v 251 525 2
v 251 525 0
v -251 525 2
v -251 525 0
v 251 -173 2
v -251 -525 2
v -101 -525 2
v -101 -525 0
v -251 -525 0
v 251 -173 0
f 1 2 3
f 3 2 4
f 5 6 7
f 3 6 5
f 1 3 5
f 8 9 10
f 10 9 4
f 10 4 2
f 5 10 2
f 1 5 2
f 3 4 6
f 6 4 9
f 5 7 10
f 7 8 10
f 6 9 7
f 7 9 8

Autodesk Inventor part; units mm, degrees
ref_plane "YZ Plane" through (0, 0, 0) normal (1, 0, 0) x (0, 1, 0)
ref_plane "XZ Plane" through (0, 0, 0) normal (0, 1, 0) x (-1, 0, 0)
ref_plane "XY Plane" through (0, 0, 0) normal (0, 0, 1) x (1, 0, 0)
sketch "Sketch1" plane through (0, 0, 0) normal (0, 0, 1) x (1, 0, 0)
  line L0 (-251, -525) -> (251, -525)
  line L1 (251, -525) -> (251, 525)
  line L2 (251, 525) -> (-251, 525)
  line L3 (-251, 525) -> (-251, -525)
  line L4 (-251, -525) -> (251, 525) construction
  line L5 (251, -525) -> (-251, 525) construction
  line L6 (-101, -525) -> (251, -173)
  point P0 (0, 0)
  dimension "d0" = 502
  dimension "d1" = 1050
  dimension "d12" = 698
  dimension "d13" = 150
extrude "Plate1" add sketch "Sketch1" along normal blind 2 contours L3 L2 L1 L6 L0
sketch "Sketch2" plane through (0, 0, 0) normal (0, 0, -1) x (-1, 0, 0)
  line L0 (-231, 505) -> (-31, 505) construction
  line L1 (-31, 505) -> (-31, 485) construction
  line L2 (-31, 485) -> (-231, 485) construction
  line L3 (-231, 485) -> (-231, 505) construction
  line L4 (-251, 525) -> (251, 525) projected
  line L5 (-251, -173) -> (-251, 525) projected
  point P0 (0, 0)
  point P1 (-48, 100)
  point P2 (-251, -525)
  point P3 (-50, 98)
  dimension "d6" = 200
  dimension "d9" = 20
  dimension "d10" = 20
  dimension "d11" = 20
mark "Mark1"
equation "\"d2\" = Thickness"
equation "\"BendReliefWidth\" = Thickness"
equation "\"BendReliefDepth\" = 0.5 * Thickness"
equation "\"CornerReliefSize\" = 4 * Thickness"
equation "\"MinimumRemnant\" = 2 * Thickness"
equation "\"TransitionRadius\" = BendRadius"
equation "\"JacobiRadiusSize\" = BendRadius"
equation "\"GapSize\" = Thickness"
equation "\"Thickness\" = 2"
equation "\"BendRadius\" = 2.75"
properties part number "TRM 016 right board main" material "AISI 304"
